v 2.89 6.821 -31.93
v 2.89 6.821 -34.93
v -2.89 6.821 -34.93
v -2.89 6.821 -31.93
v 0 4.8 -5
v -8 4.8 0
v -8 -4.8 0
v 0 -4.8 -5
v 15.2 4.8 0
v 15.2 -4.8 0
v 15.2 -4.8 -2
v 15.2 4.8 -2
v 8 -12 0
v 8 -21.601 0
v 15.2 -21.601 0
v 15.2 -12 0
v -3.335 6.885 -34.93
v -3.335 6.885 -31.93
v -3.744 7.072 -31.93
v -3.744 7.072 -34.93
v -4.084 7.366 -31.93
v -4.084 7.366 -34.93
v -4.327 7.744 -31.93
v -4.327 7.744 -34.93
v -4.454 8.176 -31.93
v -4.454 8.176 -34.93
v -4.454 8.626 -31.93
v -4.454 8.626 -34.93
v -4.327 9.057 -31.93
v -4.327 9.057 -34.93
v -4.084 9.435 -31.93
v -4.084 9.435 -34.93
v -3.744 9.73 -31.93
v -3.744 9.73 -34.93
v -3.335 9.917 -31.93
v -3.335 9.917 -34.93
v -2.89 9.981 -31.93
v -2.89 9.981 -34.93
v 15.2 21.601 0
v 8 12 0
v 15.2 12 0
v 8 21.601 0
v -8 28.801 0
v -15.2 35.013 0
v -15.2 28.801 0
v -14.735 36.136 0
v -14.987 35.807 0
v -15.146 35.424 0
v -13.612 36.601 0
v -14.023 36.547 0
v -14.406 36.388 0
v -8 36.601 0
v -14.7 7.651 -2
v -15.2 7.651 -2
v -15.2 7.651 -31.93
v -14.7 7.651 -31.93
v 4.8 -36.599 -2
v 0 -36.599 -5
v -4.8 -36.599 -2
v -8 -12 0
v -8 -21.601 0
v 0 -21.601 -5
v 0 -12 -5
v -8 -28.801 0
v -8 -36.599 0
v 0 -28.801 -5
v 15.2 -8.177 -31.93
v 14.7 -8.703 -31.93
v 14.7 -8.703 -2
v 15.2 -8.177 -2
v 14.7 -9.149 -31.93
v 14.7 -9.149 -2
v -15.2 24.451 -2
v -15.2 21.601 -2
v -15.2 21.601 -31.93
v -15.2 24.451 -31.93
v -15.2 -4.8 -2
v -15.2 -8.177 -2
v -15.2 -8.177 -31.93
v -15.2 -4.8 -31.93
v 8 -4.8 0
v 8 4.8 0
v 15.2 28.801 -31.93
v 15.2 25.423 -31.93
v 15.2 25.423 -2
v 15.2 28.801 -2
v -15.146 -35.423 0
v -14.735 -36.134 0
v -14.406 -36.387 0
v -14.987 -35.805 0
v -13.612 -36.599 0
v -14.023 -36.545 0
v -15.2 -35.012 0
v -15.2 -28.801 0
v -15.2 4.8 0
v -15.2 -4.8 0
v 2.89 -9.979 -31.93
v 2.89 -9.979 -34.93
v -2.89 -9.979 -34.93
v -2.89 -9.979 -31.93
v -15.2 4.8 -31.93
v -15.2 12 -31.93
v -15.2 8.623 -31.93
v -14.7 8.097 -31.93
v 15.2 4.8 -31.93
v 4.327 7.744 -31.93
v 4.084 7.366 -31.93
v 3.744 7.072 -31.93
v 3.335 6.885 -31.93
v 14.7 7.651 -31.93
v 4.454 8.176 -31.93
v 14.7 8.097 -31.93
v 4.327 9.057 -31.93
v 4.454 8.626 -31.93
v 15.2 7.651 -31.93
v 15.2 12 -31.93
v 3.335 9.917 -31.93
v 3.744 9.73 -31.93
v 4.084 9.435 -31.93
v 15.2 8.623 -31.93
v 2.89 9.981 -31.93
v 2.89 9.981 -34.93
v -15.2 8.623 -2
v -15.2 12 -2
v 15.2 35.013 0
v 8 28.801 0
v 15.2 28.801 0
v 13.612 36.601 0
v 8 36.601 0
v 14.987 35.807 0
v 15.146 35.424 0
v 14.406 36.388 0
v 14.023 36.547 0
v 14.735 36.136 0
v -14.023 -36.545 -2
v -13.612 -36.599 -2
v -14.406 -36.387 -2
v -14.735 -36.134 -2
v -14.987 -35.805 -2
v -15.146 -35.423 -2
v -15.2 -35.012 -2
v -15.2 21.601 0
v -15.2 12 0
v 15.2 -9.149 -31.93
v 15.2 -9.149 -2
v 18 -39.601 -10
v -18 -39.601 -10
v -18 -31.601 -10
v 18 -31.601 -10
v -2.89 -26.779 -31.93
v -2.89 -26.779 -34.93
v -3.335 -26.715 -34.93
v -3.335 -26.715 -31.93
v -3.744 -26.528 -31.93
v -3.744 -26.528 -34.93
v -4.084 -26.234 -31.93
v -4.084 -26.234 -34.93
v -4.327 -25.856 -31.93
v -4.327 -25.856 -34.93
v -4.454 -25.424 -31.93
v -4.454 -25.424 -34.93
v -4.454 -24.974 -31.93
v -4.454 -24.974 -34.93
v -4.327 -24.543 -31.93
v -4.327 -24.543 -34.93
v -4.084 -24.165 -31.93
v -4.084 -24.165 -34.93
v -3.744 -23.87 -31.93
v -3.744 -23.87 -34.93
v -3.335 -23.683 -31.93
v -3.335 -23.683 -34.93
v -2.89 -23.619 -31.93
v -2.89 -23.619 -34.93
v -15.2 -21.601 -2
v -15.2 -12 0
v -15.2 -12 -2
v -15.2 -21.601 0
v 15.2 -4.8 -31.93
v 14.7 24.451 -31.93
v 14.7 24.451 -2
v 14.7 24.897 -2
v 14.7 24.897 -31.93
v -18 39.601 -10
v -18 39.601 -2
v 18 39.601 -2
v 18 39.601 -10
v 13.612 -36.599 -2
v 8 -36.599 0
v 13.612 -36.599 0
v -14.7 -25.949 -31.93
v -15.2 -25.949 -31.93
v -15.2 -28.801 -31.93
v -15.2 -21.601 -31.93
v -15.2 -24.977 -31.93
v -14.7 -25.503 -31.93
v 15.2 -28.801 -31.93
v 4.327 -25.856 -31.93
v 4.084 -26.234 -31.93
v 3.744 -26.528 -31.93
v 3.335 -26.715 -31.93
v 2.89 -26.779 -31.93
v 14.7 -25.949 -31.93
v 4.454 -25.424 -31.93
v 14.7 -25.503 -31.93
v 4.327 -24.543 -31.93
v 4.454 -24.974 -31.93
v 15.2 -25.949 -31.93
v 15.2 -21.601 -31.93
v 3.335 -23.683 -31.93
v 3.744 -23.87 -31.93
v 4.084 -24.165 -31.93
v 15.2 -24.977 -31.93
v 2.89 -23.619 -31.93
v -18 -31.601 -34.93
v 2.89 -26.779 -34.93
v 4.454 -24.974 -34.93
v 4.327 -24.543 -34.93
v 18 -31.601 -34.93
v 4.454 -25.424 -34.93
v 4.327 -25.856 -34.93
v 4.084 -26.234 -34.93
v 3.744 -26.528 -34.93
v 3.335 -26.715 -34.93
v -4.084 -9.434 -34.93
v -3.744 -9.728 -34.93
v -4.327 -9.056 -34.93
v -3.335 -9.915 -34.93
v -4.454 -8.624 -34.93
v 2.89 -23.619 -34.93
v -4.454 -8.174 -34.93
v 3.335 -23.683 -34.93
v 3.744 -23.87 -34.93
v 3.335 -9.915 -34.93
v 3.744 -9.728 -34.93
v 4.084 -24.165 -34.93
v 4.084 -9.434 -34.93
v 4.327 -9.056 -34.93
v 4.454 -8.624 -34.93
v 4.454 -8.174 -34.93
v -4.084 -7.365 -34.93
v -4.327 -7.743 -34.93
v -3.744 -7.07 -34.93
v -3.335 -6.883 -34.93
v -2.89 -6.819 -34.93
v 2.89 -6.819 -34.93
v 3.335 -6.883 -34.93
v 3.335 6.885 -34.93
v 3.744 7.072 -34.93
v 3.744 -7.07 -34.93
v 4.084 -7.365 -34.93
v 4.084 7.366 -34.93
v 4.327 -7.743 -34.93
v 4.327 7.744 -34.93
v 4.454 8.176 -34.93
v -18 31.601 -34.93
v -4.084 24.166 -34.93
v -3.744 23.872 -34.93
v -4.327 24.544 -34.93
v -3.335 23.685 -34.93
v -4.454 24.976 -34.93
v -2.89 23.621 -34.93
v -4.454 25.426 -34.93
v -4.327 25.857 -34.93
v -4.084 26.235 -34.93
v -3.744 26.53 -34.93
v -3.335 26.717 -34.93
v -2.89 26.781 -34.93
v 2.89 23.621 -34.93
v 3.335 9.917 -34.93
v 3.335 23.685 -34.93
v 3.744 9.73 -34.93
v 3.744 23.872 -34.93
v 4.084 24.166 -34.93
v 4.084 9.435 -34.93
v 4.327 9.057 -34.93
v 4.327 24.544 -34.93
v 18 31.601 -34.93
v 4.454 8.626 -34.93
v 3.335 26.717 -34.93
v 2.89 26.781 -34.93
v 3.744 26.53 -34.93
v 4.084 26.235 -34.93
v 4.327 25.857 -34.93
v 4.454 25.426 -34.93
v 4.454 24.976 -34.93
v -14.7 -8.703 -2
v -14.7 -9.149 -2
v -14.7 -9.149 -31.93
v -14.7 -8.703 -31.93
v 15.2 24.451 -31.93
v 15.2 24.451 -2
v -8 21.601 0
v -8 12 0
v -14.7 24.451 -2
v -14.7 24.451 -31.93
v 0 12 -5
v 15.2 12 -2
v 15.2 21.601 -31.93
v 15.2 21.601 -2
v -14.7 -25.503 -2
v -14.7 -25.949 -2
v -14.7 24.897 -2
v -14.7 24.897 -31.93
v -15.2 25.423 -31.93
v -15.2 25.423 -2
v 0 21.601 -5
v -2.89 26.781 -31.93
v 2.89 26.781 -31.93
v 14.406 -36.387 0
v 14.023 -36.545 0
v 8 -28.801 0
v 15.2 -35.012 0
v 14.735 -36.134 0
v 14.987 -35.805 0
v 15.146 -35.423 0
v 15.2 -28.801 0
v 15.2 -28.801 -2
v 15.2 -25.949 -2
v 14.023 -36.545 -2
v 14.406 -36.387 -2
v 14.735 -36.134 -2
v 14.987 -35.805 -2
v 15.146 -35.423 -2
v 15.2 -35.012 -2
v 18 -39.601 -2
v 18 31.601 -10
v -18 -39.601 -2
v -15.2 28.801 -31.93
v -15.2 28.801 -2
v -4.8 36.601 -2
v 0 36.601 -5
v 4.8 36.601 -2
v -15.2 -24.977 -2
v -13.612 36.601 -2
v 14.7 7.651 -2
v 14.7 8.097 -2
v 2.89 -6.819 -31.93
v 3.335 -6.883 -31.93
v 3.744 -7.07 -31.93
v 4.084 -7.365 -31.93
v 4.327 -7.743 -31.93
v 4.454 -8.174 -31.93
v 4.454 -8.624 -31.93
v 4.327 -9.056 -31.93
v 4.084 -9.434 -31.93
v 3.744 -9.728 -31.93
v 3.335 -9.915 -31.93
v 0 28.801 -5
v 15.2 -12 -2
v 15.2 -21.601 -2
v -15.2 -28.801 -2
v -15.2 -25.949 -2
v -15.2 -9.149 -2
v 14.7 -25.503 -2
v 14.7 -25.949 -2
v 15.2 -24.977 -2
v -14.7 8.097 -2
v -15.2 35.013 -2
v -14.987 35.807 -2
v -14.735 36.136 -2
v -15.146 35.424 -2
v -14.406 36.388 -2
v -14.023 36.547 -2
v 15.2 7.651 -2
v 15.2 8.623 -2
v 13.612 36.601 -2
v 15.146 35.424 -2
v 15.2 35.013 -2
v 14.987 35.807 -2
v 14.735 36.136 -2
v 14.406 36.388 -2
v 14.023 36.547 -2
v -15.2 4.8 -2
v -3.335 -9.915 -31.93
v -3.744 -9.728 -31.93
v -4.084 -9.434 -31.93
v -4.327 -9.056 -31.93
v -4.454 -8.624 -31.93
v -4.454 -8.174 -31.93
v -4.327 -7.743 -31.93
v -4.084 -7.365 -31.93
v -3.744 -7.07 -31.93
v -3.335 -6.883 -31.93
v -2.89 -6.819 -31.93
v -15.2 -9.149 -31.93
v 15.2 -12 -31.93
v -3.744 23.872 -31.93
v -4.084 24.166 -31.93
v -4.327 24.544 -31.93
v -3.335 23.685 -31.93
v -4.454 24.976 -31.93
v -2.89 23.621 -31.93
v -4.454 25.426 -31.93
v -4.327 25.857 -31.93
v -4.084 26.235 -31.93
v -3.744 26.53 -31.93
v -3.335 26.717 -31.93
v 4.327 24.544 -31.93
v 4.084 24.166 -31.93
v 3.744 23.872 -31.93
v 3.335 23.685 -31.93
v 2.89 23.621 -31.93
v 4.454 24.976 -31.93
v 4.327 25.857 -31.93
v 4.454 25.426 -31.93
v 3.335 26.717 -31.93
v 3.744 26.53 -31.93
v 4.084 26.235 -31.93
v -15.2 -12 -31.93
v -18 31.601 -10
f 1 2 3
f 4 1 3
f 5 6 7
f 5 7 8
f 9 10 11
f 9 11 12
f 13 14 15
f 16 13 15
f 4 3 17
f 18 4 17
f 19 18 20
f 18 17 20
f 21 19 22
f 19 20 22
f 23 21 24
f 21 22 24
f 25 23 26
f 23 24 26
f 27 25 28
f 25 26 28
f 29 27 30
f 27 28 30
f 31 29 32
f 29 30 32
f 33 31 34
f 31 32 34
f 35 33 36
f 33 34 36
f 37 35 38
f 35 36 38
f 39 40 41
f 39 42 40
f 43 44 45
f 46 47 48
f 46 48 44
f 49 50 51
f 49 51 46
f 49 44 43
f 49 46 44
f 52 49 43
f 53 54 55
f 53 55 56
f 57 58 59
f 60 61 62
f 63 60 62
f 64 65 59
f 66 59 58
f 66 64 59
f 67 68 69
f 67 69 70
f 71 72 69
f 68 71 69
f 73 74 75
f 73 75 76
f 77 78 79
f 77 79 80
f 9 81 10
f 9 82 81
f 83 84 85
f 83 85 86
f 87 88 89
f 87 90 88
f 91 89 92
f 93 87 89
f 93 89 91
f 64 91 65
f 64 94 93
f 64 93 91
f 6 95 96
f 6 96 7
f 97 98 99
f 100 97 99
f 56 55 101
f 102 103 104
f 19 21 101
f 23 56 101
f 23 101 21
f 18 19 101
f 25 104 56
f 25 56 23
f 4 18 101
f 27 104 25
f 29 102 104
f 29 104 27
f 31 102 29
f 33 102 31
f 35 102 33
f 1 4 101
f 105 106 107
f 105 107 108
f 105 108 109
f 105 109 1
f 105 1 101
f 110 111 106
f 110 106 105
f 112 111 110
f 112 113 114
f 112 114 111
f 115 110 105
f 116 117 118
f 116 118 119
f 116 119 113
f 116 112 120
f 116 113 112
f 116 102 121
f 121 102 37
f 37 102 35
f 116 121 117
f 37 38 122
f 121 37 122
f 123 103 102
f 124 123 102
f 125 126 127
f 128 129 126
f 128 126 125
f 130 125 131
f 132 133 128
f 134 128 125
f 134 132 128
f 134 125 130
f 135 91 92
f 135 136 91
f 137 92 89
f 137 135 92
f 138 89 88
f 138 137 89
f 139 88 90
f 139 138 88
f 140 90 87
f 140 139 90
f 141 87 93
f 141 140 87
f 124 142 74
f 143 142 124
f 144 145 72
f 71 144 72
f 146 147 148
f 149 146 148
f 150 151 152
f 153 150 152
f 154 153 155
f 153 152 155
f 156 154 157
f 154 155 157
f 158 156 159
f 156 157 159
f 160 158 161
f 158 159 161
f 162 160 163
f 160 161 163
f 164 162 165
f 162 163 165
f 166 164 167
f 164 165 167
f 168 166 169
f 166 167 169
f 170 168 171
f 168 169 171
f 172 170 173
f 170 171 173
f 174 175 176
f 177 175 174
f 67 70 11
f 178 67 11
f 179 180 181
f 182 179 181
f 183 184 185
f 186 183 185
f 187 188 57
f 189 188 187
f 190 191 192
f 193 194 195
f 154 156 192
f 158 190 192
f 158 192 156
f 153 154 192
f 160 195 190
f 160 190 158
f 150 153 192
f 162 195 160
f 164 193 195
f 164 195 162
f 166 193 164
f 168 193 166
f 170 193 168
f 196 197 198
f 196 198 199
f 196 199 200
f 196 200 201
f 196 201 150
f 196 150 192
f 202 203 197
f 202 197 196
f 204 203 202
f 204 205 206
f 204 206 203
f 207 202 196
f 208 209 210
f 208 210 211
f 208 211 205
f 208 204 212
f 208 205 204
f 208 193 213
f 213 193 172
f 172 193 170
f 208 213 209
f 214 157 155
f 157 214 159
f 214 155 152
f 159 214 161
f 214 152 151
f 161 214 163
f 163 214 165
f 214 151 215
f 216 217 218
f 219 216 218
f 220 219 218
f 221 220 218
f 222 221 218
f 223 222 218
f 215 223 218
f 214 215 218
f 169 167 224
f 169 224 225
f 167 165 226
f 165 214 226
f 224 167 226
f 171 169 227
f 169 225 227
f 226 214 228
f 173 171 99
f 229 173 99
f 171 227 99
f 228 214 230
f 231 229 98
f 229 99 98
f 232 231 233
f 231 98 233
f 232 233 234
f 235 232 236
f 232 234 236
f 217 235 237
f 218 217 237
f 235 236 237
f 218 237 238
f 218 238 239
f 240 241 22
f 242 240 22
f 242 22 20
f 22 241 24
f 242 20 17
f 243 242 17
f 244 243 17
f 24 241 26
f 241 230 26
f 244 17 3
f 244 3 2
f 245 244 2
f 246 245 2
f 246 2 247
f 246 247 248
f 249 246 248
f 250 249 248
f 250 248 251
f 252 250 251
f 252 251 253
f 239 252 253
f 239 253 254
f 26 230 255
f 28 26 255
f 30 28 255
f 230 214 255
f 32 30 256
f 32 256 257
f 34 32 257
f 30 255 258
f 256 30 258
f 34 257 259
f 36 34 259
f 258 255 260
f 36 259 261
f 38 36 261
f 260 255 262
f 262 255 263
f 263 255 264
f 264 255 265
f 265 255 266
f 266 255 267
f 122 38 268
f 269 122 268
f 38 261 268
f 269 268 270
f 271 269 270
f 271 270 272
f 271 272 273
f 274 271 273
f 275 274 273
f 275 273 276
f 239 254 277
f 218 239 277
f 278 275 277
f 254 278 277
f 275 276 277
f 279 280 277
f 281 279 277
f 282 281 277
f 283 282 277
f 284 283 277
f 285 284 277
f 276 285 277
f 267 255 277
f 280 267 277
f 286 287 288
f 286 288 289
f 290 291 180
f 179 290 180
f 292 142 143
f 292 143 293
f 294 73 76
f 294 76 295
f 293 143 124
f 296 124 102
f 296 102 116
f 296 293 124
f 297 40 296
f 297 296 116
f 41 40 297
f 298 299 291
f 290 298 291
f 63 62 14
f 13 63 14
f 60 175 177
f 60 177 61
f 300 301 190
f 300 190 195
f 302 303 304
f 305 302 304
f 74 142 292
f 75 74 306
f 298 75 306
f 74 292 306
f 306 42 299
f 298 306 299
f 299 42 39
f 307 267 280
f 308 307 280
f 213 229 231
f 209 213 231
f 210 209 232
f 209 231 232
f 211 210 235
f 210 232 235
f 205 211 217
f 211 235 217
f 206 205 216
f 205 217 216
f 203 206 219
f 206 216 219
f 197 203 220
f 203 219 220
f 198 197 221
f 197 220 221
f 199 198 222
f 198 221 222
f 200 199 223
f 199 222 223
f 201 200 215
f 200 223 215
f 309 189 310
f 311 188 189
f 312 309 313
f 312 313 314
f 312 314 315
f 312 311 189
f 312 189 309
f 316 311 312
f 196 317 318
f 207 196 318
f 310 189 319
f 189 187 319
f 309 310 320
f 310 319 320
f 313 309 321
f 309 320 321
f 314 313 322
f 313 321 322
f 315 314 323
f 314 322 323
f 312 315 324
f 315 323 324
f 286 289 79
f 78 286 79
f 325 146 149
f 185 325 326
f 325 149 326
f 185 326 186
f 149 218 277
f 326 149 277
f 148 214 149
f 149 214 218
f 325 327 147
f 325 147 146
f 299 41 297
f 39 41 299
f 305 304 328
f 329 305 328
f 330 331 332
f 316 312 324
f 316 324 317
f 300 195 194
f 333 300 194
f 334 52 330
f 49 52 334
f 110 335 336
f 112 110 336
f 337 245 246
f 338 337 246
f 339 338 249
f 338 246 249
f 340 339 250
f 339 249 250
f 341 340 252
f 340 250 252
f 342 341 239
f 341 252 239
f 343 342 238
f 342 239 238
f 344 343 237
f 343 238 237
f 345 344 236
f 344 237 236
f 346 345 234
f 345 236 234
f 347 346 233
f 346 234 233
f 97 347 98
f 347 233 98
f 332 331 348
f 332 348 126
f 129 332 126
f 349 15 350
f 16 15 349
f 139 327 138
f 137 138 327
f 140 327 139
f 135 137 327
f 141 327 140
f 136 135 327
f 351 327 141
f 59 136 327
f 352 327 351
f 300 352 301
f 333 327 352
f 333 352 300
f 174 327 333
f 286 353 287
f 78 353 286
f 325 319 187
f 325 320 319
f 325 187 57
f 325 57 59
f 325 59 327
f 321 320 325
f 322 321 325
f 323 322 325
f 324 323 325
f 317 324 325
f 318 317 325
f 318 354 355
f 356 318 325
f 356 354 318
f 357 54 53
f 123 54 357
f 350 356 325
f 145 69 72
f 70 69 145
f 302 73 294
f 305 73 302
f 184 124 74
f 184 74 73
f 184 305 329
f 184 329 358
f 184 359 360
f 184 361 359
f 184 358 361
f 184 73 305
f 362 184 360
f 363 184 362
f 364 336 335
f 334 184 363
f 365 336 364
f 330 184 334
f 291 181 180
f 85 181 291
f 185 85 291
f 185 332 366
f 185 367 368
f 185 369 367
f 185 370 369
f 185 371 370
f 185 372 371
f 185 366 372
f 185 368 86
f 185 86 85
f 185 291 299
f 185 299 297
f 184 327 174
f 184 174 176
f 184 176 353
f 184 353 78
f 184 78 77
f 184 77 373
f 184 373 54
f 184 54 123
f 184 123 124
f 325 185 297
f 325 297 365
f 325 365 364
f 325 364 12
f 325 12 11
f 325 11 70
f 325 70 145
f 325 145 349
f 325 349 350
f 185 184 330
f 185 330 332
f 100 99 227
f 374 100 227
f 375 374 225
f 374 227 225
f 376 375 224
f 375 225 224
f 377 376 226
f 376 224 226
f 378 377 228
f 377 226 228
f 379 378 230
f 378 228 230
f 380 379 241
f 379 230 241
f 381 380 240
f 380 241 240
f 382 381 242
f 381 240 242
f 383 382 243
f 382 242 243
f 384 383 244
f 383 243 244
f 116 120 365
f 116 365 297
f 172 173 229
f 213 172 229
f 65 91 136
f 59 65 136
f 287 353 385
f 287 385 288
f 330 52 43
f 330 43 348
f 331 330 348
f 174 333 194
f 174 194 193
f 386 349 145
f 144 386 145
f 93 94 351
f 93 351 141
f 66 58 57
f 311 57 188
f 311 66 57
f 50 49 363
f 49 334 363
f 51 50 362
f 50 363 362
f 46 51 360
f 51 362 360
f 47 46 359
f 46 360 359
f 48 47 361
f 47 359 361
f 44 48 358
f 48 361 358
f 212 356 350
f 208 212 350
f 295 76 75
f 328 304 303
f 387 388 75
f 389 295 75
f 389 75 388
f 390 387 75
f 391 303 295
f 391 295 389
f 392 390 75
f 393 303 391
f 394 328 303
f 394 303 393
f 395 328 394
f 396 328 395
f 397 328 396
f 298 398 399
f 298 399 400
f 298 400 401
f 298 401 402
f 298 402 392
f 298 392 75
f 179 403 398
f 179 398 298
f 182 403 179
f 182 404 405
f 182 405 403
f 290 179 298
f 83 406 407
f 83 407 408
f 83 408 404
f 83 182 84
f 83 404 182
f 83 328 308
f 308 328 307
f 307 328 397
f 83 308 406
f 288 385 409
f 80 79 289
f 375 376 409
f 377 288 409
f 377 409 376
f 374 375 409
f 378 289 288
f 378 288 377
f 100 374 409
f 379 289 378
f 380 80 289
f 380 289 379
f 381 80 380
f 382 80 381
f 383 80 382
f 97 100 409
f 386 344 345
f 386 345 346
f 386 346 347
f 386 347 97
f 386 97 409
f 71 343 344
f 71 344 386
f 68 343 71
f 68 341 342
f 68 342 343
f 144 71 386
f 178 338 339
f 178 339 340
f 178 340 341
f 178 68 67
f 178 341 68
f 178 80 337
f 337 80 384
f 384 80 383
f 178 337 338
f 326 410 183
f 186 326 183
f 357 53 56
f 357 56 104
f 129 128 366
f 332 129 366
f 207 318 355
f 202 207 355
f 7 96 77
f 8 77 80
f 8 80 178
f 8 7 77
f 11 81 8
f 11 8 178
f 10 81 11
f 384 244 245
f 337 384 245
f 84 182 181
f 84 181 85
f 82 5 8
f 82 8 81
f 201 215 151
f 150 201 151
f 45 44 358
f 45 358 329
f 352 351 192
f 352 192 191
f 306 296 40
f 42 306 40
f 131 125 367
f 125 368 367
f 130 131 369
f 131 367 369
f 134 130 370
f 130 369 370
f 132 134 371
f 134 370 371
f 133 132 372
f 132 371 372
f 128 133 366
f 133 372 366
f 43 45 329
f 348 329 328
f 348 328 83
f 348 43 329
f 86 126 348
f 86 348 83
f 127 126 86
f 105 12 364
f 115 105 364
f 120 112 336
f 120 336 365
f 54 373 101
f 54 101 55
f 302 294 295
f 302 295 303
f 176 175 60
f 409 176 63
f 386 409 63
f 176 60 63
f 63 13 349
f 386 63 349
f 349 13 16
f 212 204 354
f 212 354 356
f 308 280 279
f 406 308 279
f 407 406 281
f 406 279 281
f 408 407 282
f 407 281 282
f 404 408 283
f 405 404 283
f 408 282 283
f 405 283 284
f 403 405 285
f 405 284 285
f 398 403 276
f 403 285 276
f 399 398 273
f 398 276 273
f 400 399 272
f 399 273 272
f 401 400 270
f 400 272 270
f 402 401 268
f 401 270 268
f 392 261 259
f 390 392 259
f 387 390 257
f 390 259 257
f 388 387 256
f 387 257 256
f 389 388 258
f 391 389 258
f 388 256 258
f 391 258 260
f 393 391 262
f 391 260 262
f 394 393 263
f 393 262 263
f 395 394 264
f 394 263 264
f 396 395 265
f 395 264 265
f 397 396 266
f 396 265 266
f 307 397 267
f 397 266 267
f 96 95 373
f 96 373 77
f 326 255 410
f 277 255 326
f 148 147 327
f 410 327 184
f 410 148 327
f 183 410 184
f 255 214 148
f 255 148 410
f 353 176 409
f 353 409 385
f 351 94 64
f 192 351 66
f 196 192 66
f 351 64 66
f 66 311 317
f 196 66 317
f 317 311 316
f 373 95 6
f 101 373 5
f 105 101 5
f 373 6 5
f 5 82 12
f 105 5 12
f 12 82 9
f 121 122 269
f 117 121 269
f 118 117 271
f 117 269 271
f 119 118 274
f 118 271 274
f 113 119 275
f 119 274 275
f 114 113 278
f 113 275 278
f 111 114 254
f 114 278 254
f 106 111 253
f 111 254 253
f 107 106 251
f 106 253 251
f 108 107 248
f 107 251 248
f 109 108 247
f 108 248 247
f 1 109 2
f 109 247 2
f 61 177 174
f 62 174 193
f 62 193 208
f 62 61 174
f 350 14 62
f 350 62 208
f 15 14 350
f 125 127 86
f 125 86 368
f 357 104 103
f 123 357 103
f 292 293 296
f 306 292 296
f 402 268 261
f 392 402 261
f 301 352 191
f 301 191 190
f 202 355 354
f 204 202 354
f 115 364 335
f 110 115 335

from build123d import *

# Parameters (mm, degrees)
SKETCH1_W              = 36
SKETCH1_H              = 79.20150733
BOSS_EXTRUDE1_DEPTH    = 33.93
CUT_EXTRUDE1_REACH     = 65.368
SKETCH2_W              = 23.93
SKETCH2_H              = 8
SKETCH3_W              = 30.4
SKETCH3_H              = 7.2
CUT_EXTRUDE2_DEPTH     = 31.93
CUT_EXTRUDE3_START     = -3
CUT_EXTRUDE3_DEPTH     = 73.2
CUT_EXTRUDE4_REACH     = 55.961
BOSS_EXTRUDE2_REACH    = 57.168
LPATTERN1_COUNT        = 4
LPATTERN1_PITCH        = 16.8
LPATTERN1_COPY_1_REACH = 57.168
LPATTERN1_COPY_2_REACH = 57.168
LPATTERN1_COPY_3_REACH = 57.168
SKETCH7_W              = 36
SKETCH7_H              = 79.20150733
CUT_EXTRUDE5_DEPTH     = 2
FILLET1_R              = 1.5875
MOVE_START             = -34.93
MOVE_FACE1_OUTLINE_W   = 36
MOVE_FACE1_OUTLINE_H   = 63.20150733
MOVE_FACE1_DEPTH       = 1


# Read off the part's stored shape, not the designer's step: Move Face1
with BuildPart() as part:
    # Sketch1 → Boss-Extrude1 (new body)
    with BuildSketch(Plane.XY):
        Rectangle(SKETCH1_W, SKETCH1_H)
    extrude(amount=-BOSS_EXTRUDE1_DEPTH)

    # Sketch2 → Cut-Extrude1 (cut, up to next)
    with BuildSketch(Plane(origin=(18, 0, 0), x_dir=(0, 0, -1), z_dir=(1, 0, 0)), mode=Mode.PRIVATE) as cut_extrude1_sk1:
        with Locations((21.965, 35.600753665)):
            Rectangle(SKETCH2_W, SKETCH2_H)
    cut_extrude1_tool1 = extrude(cut_extrude1_sk1.sketch, amount=-CUT_EXTRUDE1_REACH, mode=Mode.PRIVATE) & part.part
    # Sketch2 → Cut-Extrude1 (cut, up to next)
    with BuildSketch(Plane(origin=(18, 0, 0), x_dir=(0, 0, -1), z_dir=(1, 0, 0)), mode=Mode.PRIVATE) as cut_extrude1_sk2:
        with Locations((21.965, -35.600753665)):
            Rectangle(SKETCH2_W, SKETCH2_H)
    cut_extrude1_tool2 = extrude(cut_extrude1_sk2.sketch, amount=-CUT_EXTRUDE1_REACH, mode=Mode.PRIVATE) & part.part
    add(cut_extrude1_tool1.solids().sort_by_distance((18, 35.600754, -21.965))[0], mode=Mode.SUBTRACT)
    add(cut_extrude1_tool2.solids().sort_by_distance((18, -35.600754, -21.965))[0], mode=Mode.SUBTRACT)

    # Sketch3 → Cut-Extrude2 (cut)
    with BuildSketch(Plane.XY):
        with Locations((0, 8.400251222)):
            Rectangle(SKETCH3_W, SKETCH3_H)
        with Locations((0, 25.200753665)):
            Rectangle(SKETCH3_W, SKETCH3_H)
        with Locations((0, -8.400251222)):
            Rectangle(SKETCH3_W, SKETCH3_H)
        with Locations((0, -25.200753665)):
            Rectangle(SKETCH3_W, SKETCH3_H)
    extrude(amount=-CUT_EXTRUDE2_DEPTH, mode=Mode.SUBTRACT)

    # Sketch4 → Cut-Extrude3 (cut)
    with BuildSketch(Plane(origin=(0, 39.600753665, 0), x_dir=(1, 0, 0), z_dir=(0, 1, 0)).offset(CUT_EXTRUDE3_START)):
        Polygon((-8, 0), (0, 5), (8, 0), align=None)
    extrude(amount=-CUT_EXTRUDE3_DEPTH, mode=Mode.SUBTRACT)

    # Sketch5 → Cut-Extrude4 (cut, up to next)
    with BuildSketch(Plane.XY.offset(-31.93), mode=Mode.PRIVATE) as cut_extrude4_sk1:
        with BuildLine():
            Line((-2.89, 26.780753665), (2.89, 26.780753665))
            ThreePointArc((2.89, 26.780753665), (4.47, 25.200753665), (2.89, 23.620753665))
            Line((2.89, 23.620753665), (-2.89, 23.620753665))
            ThreePointArc((-2.89, 23.620753665), (-4.47, 25.200753665), (-2.89, 26.780753665))
        make_face()
    cut_extrude4_tool1 = extrude(cut_extrude4_sk1.sketch, amount=-CUT_EXTRUDE4_REACH, mode=Mode.PRIVATE) & part.part
    cut_extrude4 = cut_extrude4_tool1.solids().sort_by_distance((0, 25.200754, -31.93))[0]
    add(cut_extrude4, mode=Mode.SUBTRACT)

    # Sketch6 → Boss-Extrude2 (add, up to next)
    with BuildSketch(Plane.XY, mode=Mode.PRIVATE) as boss_extrude2_sk1:
        Polygon((-15.2, 25.423123011), (-15.2, 24.450753665), (-14.7, 24.450753665), (-14.7, 24.896968819), align=None)
    boss_extrude2_tool1 = extrude(boss_extrude2_sk1.sketch, amount=-BOSS_EXTRUDE2_REACH, mode=Mode.PRIVATE) - part.part
    boss_extrude2 = boss_extrude2_tool1.solids().sort_by_distance((-14.980908, 24.821662, 0))[0]
    add(boss_extrude2)

    # Mirror1: Boss-Extrude2 across plane
    add(boss_extrude2.mirror(Plane(origin=(0, 0, 0), x_dir=(0, 0, 1), z_dir=(1, 0, 0))))

    # LPattern1: Cut-Extrude4, Boss-Extrude2 ×4
    with Locations(*[(0, -i * LPATTERN1_PITCH, 0) for i in range(1, LPATTERN1_COUNT)]):
        add(cut_extrude4, mode=Mode.SUBTRACT)
        add(boss_extrude2)

    # LPattern1 copy 1 sketch → LPattern1 copy 1 (add, up to next)
    with BuildSketch(Plane(origin=(0, -16.8, 0), x_dir=(-1, 0, 0), z_dir=(0, 0, 1)), mode=Mode.PRIVATE) as lpattern1_copy_1_sk1:
        Polygon((-15.2, -25.423123011), (-15.2, -24.450753665), (-14.7, -24.450753665), (-14.7, -24.896968819), align=None)
    lpattern1_copy_1_tool1 = extrude(lpattern1_copy_1_sk1.sketch, amount=-LPATTERN1_COPY_1_REACH, mode=Mode.PRIVATE) - part.part
    add(lpattern1_copy_1_tool1.solids().sort_by_distance((14.980908, 8.021662, 0))[0])

    # LPattern1 copy 2 sketch → LPattern1 copy 2 (add, up to next)
    with BuildSketch(Plane(origin=(0, -33.6, 0), x_dir=(-1, 0, 0), z_dir=(0, 0, 1)), mode=Mode.PRIVATE) as lpattern1_copy_2_sk1:
        Polygon((-15.2, -25.423123011), (-15.2, -24.450753665), (-14.7, -24.450753665), (-14.7, -24.896968819), align=None)
    lpattern1_copy_2_tool1 = extrude(lpattern1_copy_2_sk1.sketch, amount=-LPATTERN1_COPY_2_REACH, mode=Mode.PRIVATE) - part.part
    add(lpattern1_copy_2_tool1.solids().sort_by_distance((14.980908, -8.778338, 0))[0])

    # LPattern1 copy 3 sketch → LPattern1 copy 3 (add, up to next)
    with BuildSketch(Plane(origin=(0, -50.4, 0), x_dir=(-1, 0, 0), z_dir=(0, 0, 1)), mode=Mode.PRIVATE) as lpattern1_copy_3_sk1:
        Polygon((-15.2, -25.423123011), (-15.2, -24.450753665), (-14.7, -24.450753665), (-14.7, -24.896968819), align=None)
    lpattern1_copy_3_tool1 = extrude(lpattern1_copy_3_sk1.sketch, amount=-LPATTERN1_COPY_3_REACH, mode=Mode.PRIVATE) - part.part
    add(lpattern1_copy_3_tool1.solids().sort_by_distance((14.980908, -25.578338, 0))[0])

    # Sketch7 → Cut-Extrude5 (cut)
    with BuildSketch(Plane.XY):
        Rectangle(SKETCH7_W, SKETCH7_H)
        Polygon((-15.2, -36.599246335), (15.2, -36.599246335), (15.2, -25.949246335), (14.7, -25.949246335), (14.7, -25.503031181), (15.2, -24.976876989), (15.2, -9.149246335), (14.7, -9.149246335), (14.7, -8.703031181), (15.2, -8.176876989), (15.2, 7.650753665), (14.7, 7.650753665), (14.7, 8.096968819), (15.2, 8.623123011), (15.2, 24.450753665), (14.7, 24.450753665), (14.7, 24.896968819), (15.2, 25.423123011), (15.2, 36.600753665), (-15.2, 36.600753665), (-15.2, 25.423123011), (-14.7, 24.896968819), (-14.7, 24.450753665), (-15.2, 24.450753665), (-15.2, 8.623123011), (-14.7, 8.096968819), (-14.7, 7.650753665), (-15.2, 7.650753665), (-15.2, -8.176876989), (-14.7, -8.703031181), (-14.7, -9.149246335), (-15.2, -9.149246335), (-15.2, -24.976876989), (-14.7, -25.503031181), (-14.7, -25.949246335), (-15.2, -25.949246335), align=None, mode=Mode.SUBTRACT)
    extrude(amount=-CUT_EXTRUDE5_DEPTH, mode=Mode.SUBTRACT)

    # Fillet1
    fillet1_edges = [part.edges().sort_by_distance(p)[0] for p in [
        (15.2, 36.600753665, -1),
        (-15.2, -36.599246335, -1),
        (-15.2, 36.600753665, -1),
        (15.2, -36.599246335, -1),
    ]]
    fillet(fillet1_edges, radius=FILLET1_R)

    # Move Face1 outline → Move Face1 (add)
    with BuildSketch(Plane.XY.offset(MOVE_START)):
        Rectangle(MOVE_FACE1_OUTLINE_W, MOVE_FACE1_OUTLINE_H)
        with BuildLine():
            ThreePointArc((-2.89, -26.779246335), (-4.47, -25.199246335), (-2.89, -23.619246335))
            Line((-2.89, -23.619246335), (2.89, -23.619246335))
            ThreePointArc((2.89, -23.619246335), (4.47, -25.199246335), (2.89, -26.779246335))
            Line((2.89, -26.779246335), (-2.89, -26.779246335))
        make_face(mode=Mode.SUBTRACT)
        with BuildLine():
            ThreePointArc((-2.89, -9.979246335), (-4.47, -8.399246335), (-2.89, -6.819246335))
            Line((-2.89, -6.819246335), (2.89, -6.819246335))
            ThreePointArc((2.89, -6.819246335), (4.47, -8.399246335), (2.89, -9.979246335))
            Line((2.89, -9.979246335), (-2.89, -9.979246335))
        make_face(mode=Mode.SUBTRACT)
        with BuildLine():
            ThreePointArc((-2.89, 6.820753665), (-4.47, 8.400753665), (-2.89, 9.980753665))
            Line((-2.89, 9.980753665), (2.89, 9.980753665))
            ThreePointArc((2.89, 9.980753665), (4.47, 8.400753665), (2.89, 6.820753665))
            Line((2.89, 6.820753665), (-2.89, 6.820753665))
        make_face(mode=Mode.SUBTRACT)
        with BuildLine():
            ThreePointArc((-2.89, 23.620753665), (-4.47, 25.200753665), (-2.89, 26.780753665))
            Line((-2.89, 26.780753665), (2.89, 26.780753665))
            ThreePointArc((2.89, 26.780753665), (4.47, 25.200753665), (2.89, 23.620753665))
            Line((2.89, 23.620753665), (-2.89, 23.620753665))
        make_face(mode=Mode.SUBTRACT)
    extrude(amount=MOVE_FACE1_DEPTH)


solid = part.part
